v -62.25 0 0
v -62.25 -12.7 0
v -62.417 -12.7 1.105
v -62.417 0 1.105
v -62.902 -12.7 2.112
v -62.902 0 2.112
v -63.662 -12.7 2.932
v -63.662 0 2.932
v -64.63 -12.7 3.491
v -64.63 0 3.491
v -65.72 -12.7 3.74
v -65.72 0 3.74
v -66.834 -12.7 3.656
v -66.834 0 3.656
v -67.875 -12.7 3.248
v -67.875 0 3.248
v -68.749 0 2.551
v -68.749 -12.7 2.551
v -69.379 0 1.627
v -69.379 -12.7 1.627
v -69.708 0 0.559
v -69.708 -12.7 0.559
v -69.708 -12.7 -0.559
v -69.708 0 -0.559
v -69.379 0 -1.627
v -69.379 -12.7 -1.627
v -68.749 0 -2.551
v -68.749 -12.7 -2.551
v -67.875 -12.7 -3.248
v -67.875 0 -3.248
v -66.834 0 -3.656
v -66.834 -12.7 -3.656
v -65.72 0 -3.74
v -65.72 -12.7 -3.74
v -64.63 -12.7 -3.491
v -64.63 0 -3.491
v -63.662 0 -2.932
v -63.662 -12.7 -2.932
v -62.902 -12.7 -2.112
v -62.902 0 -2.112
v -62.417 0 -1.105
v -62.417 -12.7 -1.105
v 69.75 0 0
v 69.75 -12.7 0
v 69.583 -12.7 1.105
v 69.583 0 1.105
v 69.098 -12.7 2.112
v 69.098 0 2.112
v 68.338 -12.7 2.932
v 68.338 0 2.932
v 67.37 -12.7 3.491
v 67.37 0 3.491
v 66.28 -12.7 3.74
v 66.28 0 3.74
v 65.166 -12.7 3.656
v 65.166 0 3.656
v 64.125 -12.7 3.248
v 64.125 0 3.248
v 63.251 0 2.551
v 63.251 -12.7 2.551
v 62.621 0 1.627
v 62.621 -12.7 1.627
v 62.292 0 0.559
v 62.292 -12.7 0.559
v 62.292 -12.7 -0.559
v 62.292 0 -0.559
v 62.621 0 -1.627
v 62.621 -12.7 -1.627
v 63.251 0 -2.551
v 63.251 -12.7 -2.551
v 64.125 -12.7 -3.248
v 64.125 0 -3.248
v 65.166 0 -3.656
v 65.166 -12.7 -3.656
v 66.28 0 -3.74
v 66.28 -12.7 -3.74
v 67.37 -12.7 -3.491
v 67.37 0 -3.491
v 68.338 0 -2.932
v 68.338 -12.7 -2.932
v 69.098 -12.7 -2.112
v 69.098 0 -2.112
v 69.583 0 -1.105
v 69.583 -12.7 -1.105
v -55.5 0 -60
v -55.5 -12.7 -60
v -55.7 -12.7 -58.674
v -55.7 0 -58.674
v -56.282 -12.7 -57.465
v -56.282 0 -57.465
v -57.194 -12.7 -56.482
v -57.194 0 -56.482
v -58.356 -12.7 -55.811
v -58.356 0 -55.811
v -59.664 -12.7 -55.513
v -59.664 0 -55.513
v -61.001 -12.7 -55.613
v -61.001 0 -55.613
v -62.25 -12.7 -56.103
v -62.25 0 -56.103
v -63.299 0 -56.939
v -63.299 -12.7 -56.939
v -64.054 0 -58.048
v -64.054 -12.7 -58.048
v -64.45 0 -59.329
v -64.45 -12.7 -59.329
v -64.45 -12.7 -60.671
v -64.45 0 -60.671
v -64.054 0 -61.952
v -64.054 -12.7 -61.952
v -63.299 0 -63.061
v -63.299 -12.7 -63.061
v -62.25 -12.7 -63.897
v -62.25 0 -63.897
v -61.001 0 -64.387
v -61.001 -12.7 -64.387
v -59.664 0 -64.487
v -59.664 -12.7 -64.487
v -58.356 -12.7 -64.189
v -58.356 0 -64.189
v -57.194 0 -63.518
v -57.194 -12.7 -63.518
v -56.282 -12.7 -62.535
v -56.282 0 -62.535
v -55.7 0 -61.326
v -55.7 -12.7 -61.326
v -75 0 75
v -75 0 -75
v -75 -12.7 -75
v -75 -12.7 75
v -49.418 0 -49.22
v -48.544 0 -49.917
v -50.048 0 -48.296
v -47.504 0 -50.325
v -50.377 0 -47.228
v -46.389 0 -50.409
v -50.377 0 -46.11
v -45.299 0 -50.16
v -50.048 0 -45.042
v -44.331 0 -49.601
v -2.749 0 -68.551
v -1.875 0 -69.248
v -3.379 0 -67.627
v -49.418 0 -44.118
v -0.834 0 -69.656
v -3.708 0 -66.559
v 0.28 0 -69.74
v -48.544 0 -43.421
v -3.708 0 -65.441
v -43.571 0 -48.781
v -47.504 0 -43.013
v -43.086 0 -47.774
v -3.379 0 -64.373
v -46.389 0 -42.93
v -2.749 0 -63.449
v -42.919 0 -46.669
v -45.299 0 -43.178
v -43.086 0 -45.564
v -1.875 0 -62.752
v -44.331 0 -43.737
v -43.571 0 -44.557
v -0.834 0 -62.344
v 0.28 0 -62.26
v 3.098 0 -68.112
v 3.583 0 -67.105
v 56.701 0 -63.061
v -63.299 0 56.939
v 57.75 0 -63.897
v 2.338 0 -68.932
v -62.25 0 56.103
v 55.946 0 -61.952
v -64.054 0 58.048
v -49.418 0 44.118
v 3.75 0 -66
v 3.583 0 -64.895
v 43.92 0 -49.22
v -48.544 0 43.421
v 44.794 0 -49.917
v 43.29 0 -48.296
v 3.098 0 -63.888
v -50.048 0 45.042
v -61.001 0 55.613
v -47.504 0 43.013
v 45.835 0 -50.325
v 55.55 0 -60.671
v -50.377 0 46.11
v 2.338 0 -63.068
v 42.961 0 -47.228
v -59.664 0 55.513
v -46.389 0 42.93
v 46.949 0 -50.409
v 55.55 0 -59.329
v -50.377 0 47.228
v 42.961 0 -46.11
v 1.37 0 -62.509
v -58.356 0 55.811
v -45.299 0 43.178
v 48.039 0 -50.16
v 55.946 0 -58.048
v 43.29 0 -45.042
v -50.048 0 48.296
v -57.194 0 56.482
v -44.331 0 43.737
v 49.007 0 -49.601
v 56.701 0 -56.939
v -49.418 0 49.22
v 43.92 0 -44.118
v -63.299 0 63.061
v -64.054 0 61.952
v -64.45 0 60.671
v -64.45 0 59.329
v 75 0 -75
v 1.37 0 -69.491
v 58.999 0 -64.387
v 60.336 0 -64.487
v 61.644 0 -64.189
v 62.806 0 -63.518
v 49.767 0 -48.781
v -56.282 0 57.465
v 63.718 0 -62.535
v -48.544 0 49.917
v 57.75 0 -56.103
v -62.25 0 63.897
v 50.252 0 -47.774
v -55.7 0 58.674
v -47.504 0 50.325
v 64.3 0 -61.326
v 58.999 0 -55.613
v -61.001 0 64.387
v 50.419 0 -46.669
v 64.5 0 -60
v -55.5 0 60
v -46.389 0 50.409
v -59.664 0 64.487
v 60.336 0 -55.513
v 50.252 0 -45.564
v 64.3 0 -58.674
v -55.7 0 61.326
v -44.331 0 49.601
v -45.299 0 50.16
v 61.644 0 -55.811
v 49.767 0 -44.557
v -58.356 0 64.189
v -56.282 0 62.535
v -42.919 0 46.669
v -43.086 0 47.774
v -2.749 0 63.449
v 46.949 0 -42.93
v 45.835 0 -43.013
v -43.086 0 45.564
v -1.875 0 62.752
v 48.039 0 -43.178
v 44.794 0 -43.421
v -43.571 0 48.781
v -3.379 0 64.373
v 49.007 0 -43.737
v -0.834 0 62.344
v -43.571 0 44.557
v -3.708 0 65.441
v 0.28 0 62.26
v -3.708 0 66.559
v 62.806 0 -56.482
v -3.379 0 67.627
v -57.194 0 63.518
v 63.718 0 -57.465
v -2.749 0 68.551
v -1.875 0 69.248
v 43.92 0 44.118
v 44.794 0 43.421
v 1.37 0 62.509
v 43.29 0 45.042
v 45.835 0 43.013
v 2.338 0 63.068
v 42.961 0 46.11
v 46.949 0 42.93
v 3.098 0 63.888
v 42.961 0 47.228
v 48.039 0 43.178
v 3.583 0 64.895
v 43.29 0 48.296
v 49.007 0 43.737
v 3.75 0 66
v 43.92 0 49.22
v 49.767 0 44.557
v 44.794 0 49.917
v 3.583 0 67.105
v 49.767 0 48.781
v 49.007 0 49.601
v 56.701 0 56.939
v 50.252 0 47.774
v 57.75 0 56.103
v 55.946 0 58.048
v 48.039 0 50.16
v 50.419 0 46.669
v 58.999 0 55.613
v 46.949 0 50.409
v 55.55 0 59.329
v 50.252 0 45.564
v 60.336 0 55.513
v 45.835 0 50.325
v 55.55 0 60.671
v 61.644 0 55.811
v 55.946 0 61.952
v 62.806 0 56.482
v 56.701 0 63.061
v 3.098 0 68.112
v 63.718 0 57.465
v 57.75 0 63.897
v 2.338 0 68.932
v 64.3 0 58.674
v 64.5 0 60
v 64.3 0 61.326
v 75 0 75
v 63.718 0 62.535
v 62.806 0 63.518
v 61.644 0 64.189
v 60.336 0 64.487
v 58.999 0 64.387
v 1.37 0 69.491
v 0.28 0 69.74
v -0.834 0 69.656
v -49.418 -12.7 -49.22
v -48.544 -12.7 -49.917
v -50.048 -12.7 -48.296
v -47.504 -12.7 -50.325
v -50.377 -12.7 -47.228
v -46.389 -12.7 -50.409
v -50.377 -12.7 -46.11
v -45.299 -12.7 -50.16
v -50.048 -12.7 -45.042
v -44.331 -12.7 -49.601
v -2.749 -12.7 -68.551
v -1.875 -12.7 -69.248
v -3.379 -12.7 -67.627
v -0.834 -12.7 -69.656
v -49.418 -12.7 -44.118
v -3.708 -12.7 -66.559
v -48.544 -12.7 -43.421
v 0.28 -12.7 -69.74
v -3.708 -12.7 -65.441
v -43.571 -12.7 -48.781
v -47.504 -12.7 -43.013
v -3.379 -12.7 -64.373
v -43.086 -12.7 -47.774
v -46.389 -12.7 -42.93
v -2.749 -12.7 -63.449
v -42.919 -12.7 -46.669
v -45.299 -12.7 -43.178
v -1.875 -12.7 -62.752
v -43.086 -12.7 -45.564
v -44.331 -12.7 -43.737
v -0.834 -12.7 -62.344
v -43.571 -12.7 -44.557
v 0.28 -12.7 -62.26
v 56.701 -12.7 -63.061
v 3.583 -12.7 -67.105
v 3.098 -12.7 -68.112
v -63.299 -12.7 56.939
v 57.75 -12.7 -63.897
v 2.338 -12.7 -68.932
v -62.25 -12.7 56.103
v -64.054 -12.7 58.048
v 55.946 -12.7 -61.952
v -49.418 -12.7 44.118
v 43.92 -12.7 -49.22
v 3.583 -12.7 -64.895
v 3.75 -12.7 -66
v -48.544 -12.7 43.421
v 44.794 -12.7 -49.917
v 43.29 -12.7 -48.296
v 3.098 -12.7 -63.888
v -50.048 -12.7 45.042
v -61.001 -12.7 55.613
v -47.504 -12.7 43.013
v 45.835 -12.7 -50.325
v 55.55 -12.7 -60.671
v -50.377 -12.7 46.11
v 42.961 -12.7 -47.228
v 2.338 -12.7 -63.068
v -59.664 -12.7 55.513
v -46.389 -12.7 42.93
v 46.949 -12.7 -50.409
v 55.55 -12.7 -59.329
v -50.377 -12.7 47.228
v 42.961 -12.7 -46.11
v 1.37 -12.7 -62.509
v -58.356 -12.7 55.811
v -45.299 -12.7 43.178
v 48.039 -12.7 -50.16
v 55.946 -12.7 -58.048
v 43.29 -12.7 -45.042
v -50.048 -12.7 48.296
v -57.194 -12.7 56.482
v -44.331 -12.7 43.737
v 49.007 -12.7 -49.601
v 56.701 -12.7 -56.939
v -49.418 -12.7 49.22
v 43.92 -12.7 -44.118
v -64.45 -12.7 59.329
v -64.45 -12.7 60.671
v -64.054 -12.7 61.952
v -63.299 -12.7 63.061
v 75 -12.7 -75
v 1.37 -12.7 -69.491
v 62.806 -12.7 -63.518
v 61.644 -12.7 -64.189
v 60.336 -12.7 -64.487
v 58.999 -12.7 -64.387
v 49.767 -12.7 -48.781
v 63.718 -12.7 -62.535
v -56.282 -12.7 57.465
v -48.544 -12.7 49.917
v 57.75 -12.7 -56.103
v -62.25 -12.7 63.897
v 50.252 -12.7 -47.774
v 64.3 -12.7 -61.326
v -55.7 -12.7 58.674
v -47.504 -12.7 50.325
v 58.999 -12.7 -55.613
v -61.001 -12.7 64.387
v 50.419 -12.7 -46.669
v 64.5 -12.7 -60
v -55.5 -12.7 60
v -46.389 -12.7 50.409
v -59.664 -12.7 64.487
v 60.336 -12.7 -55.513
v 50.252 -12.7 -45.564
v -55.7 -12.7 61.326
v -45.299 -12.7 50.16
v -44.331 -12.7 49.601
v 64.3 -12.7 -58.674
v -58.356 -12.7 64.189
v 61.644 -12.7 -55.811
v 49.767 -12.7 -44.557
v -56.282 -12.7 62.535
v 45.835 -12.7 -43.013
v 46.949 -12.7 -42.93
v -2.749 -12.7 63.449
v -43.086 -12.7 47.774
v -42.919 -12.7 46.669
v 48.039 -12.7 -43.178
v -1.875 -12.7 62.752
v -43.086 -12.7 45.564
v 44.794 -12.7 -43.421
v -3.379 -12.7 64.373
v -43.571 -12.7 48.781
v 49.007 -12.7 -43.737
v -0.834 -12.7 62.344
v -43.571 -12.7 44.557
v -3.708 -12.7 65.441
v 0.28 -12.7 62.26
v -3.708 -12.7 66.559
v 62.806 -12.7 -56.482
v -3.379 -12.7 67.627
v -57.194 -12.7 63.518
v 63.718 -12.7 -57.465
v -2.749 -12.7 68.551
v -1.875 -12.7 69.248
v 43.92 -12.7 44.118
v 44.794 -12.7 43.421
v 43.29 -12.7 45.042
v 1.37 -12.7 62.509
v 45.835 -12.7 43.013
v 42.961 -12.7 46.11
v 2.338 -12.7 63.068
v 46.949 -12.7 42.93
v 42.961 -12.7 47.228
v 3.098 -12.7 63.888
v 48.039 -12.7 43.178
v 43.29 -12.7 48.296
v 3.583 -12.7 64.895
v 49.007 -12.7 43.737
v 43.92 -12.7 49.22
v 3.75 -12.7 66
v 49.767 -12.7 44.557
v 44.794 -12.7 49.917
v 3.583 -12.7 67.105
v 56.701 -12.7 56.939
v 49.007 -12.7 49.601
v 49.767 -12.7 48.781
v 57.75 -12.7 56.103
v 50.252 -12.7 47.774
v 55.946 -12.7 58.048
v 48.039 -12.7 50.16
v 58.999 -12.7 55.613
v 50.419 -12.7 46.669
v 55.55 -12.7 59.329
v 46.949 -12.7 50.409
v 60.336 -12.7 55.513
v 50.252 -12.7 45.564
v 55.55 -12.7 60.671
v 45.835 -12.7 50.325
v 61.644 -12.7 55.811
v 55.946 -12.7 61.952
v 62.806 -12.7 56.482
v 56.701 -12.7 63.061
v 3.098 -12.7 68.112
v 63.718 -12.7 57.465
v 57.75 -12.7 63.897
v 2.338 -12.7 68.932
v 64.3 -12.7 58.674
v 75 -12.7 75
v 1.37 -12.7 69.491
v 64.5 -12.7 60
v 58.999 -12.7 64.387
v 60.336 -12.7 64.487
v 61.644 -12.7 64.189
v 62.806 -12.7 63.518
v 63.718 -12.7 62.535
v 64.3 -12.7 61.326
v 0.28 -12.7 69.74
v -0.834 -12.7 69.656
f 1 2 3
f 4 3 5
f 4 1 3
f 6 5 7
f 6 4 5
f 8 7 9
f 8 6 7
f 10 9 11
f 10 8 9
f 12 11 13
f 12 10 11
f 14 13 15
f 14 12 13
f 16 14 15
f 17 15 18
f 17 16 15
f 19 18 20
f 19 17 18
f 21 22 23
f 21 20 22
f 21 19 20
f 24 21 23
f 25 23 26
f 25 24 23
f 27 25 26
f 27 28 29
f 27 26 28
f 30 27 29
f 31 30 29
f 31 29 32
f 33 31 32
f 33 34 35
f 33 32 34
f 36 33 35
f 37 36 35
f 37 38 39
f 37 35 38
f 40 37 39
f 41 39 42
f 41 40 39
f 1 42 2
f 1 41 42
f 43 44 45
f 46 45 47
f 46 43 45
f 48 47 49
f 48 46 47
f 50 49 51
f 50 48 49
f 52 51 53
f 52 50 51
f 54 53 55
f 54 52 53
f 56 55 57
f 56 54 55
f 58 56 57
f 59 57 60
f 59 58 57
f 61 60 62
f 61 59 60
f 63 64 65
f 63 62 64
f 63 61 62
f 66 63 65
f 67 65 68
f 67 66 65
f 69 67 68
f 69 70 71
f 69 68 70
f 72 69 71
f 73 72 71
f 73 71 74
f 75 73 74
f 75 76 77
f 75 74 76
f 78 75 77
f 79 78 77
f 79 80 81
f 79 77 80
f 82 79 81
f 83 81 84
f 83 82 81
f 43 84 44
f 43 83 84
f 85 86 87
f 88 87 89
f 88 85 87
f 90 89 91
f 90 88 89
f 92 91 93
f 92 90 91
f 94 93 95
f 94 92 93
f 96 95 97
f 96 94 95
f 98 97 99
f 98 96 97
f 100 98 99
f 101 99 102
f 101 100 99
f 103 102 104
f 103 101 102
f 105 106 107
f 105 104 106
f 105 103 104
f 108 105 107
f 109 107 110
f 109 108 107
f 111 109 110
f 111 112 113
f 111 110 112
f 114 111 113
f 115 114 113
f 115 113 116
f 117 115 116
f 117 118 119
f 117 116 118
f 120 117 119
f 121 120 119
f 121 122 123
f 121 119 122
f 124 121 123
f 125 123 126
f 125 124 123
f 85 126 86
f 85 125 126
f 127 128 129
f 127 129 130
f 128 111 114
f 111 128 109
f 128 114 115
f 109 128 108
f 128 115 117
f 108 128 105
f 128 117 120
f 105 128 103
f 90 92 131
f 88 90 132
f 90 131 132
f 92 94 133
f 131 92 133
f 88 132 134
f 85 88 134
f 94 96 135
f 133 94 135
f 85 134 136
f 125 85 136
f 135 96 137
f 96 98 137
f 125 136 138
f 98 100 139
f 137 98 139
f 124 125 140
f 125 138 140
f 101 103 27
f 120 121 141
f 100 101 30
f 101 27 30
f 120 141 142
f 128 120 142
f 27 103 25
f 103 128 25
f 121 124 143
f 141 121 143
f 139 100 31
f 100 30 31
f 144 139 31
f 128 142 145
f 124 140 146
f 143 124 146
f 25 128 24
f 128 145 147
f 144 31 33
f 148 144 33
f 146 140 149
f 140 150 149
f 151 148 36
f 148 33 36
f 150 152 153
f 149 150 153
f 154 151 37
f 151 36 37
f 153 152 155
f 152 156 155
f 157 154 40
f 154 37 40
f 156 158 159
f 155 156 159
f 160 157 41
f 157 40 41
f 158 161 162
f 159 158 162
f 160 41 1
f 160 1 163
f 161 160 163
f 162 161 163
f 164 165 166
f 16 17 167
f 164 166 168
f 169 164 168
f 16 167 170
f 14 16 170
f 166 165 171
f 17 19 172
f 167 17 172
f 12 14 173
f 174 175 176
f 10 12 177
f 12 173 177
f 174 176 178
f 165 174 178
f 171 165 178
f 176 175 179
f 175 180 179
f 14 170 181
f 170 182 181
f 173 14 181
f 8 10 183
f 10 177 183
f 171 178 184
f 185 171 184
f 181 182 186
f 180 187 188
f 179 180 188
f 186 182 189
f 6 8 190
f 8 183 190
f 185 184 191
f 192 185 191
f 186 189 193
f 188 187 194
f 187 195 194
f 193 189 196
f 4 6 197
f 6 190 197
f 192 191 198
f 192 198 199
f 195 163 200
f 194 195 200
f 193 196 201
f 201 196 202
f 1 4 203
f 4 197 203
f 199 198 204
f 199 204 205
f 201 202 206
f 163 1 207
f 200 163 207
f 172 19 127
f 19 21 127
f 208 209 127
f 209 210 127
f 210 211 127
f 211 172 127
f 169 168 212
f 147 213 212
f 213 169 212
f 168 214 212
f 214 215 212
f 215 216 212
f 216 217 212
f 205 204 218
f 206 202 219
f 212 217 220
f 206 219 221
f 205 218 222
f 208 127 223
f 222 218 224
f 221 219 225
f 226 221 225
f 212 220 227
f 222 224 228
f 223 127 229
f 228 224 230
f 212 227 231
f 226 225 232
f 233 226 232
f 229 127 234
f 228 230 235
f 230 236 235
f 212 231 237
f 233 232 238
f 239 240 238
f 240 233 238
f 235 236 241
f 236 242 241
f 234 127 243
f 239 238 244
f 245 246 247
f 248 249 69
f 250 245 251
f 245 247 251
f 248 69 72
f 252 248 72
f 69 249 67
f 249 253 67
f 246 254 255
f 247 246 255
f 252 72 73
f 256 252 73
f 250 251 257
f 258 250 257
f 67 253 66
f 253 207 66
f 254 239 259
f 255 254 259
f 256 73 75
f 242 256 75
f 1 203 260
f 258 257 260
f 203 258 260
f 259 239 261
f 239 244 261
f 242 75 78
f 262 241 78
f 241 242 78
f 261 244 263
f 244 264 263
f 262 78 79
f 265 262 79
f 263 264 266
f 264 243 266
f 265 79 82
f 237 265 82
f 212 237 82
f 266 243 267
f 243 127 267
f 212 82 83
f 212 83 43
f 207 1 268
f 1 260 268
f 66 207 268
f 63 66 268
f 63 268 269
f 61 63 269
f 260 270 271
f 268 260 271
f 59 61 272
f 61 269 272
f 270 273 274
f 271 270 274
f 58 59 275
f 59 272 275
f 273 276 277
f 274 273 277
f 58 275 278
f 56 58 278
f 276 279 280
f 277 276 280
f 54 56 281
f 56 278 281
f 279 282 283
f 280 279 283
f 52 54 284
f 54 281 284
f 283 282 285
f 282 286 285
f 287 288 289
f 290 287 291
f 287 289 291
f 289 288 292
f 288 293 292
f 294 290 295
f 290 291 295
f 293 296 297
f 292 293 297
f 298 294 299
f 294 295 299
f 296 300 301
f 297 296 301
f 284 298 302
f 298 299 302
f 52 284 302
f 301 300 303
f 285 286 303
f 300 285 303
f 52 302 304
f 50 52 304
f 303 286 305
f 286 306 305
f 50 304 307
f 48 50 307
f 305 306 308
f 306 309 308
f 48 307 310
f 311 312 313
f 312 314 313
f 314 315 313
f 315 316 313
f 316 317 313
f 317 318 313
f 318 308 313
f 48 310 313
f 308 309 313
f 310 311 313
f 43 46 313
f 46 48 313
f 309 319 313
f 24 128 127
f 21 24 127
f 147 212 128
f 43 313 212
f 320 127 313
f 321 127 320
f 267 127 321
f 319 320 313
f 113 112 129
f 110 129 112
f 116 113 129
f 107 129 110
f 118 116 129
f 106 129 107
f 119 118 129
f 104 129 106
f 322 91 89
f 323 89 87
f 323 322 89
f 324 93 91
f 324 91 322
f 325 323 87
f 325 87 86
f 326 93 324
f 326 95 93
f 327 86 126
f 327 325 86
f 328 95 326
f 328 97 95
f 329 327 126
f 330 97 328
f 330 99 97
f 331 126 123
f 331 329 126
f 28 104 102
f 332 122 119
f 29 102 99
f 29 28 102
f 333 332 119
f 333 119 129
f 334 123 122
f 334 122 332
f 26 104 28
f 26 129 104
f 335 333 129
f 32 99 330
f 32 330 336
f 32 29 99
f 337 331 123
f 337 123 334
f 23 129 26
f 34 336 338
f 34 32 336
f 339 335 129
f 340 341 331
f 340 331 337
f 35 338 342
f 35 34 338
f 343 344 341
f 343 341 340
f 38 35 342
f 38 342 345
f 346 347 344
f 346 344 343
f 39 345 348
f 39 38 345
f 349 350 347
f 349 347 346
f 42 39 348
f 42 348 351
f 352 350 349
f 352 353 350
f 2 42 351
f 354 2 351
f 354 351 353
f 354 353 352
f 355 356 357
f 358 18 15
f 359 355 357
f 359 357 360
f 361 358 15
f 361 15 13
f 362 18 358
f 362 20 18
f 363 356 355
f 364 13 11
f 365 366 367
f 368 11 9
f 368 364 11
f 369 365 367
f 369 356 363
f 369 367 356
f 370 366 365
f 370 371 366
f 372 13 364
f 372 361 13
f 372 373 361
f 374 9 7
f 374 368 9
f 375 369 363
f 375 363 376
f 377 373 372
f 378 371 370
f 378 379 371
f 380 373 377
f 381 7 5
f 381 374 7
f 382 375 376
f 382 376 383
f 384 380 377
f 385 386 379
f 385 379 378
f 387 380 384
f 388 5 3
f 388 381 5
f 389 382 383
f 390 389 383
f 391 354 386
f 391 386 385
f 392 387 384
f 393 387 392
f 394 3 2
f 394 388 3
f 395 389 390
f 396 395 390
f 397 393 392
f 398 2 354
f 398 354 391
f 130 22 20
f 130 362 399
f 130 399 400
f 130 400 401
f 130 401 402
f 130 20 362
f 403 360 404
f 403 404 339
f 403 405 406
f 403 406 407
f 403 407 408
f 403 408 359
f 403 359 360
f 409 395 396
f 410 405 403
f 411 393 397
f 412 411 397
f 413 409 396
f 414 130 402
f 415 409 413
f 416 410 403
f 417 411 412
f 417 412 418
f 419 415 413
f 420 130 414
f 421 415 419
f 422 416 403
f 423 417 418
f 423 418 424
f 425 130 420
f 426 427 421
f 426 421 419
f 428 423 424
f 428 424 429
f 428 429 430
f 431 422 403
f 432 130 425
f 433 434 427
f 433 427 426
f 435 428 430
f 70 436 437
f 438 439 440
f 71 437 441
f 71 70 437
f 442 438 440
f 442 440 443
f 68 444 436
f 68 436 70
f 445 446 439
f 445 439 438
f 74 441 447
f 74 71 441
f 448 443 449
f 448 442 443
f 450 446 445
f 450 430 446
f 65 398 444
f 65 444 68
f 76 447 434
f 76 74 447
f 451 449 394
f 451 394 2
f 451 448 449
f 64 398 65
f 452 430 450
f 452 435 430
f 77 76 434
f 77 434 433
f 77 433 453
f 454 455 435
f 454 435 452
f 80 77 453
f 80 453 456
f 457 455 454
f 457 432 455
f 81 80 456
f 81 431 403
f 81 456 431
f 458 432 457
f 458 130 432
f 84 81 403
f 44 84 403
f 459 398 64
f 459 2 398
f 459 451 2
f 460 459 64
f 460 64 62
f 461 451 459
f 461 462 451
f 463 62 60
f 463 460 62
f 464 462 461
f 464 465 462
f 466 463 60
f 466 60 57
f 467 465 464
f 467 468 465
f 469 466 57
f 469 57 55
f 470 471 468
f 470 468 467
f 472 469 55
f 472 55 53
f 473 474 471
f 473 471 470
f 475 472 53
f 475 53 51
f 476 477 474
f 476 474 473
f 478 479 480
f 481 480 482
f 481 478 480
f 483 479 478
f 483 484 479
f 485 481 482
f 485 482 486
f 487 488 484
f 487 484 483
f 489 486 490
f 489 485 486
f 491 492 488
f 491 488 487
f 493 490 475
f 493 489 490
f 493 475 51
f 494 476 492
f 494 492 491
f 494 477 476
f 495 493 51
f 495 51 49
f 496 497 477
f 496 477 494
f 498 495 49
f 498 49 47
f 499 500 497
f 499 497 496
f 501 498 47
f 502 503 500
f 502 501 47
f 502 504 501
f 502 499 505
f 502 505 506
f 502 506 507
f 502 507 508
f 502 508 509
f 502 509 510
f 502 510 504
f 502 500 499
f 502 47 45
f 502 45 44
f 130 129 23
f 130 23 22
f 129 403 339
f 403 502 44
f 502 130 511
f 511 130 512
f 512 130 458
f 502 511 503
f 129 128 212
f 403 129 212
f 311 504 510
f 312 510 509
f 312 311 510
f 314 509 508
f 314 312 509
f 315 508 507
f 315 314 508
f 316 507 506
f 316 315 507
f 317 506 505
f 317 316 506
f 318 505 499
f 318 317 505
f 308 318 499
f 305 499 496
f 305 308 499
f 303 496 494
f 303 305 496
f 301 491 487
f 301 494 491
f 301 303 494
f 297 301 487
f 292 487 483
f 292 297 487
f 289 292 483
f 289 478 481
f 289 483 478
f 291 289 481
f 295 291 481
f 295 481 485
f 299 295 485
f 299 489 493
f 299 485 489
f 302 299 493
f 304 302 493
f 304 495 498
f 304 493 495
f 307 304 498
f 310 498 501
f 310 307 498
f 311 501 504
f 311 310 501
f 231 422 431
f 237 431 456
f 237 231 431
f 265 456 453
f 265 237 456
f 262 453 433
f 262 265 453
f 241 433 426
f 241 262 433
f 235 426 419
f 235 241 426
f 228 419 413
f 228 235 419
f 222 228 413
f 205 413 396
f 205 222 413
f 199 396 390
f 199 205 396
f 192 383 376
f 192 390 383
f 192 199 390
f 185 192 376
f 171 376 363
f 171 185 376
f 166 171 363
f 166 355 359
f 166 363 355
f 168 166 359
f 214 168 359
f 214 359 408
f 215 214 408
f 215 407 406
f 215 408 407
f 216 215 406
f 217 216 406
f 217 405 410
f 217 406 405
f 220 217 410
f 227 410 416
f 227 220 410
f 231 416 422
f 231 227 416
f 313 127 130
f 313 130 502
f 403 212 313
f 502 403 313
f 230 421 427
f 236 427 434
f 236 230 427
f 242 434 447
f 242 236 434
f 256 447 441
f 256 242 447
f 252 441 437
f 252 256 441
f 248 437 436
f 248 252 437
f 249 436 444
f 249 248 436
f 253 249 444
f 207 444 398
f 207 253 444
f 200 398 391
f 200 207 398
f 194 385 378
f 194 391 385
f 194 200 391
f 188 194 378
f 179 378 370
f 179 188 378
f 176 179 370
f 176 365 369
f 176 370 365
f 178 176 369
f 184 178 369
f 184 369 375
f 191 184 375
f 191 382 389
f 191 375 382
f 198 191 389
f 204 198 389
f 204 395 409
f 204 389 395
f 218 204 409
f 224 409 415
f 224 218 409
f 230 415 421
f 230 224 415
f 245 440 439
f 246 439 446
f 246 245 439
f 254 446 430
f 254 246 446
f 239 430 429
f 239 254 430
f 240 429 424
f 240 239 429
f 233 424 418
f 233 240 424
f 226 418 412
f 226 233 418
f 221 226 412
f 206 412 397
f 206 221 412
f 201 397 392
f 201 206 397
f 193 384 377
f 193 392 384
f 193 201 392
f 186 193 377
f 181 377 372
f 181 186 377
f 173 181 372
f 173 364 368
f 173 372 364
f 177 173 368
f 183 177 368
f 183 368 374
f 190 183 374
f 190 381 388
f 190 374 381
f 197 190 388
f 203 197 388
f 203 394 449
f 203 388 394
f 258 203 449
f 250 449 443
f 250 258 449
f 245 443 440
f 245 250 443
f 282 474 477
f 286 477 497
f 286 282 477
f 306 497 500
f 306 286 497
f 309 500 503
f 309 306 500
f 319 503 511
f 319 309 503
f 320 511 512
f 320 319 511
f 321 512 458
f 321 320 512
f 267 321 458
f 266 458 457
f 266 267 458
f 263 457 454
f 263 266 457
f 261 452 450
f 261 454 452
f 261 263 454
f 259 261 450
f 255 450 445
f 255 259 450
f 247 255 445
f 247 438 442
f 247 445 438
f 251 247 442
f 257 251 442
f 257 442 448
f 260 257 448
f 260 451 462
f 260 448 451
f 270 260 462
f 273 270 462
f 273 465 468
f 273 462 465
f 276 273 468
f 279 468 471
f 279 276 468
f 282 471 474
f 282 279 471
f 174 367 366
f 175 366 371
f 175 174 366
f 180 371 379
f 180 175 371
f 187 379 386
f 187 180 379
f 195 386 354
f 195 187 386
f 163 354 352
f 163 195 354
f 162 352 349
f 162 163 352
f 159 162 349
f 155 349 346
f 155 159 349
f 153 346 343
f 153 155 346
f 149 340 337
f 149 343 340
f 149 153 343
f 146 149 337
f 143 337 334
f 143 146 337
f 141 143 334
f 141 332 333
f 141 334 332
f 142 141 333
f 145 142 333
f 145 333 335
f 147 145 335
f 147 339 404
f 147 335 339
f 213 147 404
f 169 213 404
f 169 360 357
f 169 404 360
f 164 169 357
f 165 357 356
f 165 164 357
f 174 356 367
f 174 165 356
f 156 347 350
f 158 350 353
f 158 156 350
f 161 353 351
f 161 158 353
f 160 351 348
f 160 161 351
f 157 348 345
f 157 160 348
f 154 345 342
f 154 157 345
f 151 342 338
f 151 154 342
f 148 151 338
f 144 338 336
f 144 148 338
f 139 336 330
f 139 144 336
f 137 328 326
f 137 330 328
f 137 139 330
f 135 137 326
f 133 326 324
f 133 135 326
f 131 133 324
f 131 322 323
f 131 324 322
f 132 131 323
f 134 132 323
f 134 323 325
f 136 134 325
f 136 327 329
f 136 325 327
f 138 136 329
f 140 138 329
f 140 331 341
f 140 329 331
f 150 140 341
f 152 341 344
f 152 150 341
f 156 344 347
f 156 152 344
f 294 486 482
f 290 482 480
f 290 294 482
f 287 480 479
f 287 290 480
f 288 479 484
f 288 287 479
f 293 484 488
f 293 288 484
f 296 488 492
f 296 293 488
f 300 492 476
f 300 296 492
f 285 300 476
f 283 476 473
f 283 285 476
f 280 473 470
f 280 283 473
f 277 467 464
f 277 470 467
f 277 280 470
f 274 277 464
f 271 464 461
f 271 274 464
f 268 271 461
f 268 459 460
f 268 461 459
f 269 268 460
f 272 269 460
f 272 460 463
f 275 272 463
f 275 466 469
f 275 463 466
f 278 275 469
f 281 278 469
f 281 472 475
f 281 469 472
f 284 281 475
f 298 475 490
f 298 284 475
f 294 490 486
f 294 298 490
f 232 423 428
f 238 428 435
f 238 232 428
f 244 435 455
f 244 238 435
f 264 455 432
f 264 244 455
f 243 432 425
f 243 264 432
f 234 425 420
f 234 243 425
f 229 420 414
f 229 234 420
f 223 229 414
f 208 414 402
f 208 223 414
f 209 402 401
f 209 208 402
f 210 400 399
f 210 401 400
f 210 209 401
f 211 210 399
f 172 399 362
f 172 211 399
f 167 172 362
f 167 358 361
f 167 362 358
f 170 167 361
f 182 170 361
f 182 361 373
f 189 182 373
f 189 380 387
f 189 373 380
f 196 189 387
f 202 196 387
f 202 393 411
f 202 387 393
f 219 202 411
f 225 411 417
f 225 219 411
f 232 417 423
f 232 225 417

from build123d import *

# Parameters (mm, degrees)
F0_W     = 150
F0_H     = 150
F1_DEPTH = 12.7
F2_R     = 4.5
F2_R_2   = 3.75
F3_DEPTH = 12.701


with BuildPart() as f1:
    # F0 (on Front) → F1 (new body)
    with BuildSketch(Plane.XZ):
        Rectangle(F0_W, F0_H)
    extrude(amount=F1_DEPTH)

    # F2 (on Front) → F3 (cut, through all)
    with BuildSketch(Plane.XZ):
        with Locations((-60, 60)):
            Circle(F2_R)
        with Locations((60, 60)):
            Circle(F2_R)
        with Locations((-60, -60)):
            Circle(F2_R)
        with Locations((60, -60)):
            Circle(F2_R)
        with Locations((0, 66)):
            Circle(F2_R_2)
        with Locations((-46.669048, 46.669048)):
            Circle(F2_R_2)
        with Locations((-66, 0)):
            Circle(F2_R_2)
        with Locations((-46.669048, -46.669048)):
            Circle(F2_R_2)
        with Locations((0, -66)):
            Circle(F2_R_2)
        with Locations((46.669048, -46.669048)):
            Circle(F2_R_2)
        with Locations((66, 0)):
            Circle(F2_R_2)
        with Locations((46.669048, 46.669048)):
            Circle(F2_R_2)
    extrude(amount=F3_DEPTH, mode=Mode.SUBTRACT)


solid = f1.part
